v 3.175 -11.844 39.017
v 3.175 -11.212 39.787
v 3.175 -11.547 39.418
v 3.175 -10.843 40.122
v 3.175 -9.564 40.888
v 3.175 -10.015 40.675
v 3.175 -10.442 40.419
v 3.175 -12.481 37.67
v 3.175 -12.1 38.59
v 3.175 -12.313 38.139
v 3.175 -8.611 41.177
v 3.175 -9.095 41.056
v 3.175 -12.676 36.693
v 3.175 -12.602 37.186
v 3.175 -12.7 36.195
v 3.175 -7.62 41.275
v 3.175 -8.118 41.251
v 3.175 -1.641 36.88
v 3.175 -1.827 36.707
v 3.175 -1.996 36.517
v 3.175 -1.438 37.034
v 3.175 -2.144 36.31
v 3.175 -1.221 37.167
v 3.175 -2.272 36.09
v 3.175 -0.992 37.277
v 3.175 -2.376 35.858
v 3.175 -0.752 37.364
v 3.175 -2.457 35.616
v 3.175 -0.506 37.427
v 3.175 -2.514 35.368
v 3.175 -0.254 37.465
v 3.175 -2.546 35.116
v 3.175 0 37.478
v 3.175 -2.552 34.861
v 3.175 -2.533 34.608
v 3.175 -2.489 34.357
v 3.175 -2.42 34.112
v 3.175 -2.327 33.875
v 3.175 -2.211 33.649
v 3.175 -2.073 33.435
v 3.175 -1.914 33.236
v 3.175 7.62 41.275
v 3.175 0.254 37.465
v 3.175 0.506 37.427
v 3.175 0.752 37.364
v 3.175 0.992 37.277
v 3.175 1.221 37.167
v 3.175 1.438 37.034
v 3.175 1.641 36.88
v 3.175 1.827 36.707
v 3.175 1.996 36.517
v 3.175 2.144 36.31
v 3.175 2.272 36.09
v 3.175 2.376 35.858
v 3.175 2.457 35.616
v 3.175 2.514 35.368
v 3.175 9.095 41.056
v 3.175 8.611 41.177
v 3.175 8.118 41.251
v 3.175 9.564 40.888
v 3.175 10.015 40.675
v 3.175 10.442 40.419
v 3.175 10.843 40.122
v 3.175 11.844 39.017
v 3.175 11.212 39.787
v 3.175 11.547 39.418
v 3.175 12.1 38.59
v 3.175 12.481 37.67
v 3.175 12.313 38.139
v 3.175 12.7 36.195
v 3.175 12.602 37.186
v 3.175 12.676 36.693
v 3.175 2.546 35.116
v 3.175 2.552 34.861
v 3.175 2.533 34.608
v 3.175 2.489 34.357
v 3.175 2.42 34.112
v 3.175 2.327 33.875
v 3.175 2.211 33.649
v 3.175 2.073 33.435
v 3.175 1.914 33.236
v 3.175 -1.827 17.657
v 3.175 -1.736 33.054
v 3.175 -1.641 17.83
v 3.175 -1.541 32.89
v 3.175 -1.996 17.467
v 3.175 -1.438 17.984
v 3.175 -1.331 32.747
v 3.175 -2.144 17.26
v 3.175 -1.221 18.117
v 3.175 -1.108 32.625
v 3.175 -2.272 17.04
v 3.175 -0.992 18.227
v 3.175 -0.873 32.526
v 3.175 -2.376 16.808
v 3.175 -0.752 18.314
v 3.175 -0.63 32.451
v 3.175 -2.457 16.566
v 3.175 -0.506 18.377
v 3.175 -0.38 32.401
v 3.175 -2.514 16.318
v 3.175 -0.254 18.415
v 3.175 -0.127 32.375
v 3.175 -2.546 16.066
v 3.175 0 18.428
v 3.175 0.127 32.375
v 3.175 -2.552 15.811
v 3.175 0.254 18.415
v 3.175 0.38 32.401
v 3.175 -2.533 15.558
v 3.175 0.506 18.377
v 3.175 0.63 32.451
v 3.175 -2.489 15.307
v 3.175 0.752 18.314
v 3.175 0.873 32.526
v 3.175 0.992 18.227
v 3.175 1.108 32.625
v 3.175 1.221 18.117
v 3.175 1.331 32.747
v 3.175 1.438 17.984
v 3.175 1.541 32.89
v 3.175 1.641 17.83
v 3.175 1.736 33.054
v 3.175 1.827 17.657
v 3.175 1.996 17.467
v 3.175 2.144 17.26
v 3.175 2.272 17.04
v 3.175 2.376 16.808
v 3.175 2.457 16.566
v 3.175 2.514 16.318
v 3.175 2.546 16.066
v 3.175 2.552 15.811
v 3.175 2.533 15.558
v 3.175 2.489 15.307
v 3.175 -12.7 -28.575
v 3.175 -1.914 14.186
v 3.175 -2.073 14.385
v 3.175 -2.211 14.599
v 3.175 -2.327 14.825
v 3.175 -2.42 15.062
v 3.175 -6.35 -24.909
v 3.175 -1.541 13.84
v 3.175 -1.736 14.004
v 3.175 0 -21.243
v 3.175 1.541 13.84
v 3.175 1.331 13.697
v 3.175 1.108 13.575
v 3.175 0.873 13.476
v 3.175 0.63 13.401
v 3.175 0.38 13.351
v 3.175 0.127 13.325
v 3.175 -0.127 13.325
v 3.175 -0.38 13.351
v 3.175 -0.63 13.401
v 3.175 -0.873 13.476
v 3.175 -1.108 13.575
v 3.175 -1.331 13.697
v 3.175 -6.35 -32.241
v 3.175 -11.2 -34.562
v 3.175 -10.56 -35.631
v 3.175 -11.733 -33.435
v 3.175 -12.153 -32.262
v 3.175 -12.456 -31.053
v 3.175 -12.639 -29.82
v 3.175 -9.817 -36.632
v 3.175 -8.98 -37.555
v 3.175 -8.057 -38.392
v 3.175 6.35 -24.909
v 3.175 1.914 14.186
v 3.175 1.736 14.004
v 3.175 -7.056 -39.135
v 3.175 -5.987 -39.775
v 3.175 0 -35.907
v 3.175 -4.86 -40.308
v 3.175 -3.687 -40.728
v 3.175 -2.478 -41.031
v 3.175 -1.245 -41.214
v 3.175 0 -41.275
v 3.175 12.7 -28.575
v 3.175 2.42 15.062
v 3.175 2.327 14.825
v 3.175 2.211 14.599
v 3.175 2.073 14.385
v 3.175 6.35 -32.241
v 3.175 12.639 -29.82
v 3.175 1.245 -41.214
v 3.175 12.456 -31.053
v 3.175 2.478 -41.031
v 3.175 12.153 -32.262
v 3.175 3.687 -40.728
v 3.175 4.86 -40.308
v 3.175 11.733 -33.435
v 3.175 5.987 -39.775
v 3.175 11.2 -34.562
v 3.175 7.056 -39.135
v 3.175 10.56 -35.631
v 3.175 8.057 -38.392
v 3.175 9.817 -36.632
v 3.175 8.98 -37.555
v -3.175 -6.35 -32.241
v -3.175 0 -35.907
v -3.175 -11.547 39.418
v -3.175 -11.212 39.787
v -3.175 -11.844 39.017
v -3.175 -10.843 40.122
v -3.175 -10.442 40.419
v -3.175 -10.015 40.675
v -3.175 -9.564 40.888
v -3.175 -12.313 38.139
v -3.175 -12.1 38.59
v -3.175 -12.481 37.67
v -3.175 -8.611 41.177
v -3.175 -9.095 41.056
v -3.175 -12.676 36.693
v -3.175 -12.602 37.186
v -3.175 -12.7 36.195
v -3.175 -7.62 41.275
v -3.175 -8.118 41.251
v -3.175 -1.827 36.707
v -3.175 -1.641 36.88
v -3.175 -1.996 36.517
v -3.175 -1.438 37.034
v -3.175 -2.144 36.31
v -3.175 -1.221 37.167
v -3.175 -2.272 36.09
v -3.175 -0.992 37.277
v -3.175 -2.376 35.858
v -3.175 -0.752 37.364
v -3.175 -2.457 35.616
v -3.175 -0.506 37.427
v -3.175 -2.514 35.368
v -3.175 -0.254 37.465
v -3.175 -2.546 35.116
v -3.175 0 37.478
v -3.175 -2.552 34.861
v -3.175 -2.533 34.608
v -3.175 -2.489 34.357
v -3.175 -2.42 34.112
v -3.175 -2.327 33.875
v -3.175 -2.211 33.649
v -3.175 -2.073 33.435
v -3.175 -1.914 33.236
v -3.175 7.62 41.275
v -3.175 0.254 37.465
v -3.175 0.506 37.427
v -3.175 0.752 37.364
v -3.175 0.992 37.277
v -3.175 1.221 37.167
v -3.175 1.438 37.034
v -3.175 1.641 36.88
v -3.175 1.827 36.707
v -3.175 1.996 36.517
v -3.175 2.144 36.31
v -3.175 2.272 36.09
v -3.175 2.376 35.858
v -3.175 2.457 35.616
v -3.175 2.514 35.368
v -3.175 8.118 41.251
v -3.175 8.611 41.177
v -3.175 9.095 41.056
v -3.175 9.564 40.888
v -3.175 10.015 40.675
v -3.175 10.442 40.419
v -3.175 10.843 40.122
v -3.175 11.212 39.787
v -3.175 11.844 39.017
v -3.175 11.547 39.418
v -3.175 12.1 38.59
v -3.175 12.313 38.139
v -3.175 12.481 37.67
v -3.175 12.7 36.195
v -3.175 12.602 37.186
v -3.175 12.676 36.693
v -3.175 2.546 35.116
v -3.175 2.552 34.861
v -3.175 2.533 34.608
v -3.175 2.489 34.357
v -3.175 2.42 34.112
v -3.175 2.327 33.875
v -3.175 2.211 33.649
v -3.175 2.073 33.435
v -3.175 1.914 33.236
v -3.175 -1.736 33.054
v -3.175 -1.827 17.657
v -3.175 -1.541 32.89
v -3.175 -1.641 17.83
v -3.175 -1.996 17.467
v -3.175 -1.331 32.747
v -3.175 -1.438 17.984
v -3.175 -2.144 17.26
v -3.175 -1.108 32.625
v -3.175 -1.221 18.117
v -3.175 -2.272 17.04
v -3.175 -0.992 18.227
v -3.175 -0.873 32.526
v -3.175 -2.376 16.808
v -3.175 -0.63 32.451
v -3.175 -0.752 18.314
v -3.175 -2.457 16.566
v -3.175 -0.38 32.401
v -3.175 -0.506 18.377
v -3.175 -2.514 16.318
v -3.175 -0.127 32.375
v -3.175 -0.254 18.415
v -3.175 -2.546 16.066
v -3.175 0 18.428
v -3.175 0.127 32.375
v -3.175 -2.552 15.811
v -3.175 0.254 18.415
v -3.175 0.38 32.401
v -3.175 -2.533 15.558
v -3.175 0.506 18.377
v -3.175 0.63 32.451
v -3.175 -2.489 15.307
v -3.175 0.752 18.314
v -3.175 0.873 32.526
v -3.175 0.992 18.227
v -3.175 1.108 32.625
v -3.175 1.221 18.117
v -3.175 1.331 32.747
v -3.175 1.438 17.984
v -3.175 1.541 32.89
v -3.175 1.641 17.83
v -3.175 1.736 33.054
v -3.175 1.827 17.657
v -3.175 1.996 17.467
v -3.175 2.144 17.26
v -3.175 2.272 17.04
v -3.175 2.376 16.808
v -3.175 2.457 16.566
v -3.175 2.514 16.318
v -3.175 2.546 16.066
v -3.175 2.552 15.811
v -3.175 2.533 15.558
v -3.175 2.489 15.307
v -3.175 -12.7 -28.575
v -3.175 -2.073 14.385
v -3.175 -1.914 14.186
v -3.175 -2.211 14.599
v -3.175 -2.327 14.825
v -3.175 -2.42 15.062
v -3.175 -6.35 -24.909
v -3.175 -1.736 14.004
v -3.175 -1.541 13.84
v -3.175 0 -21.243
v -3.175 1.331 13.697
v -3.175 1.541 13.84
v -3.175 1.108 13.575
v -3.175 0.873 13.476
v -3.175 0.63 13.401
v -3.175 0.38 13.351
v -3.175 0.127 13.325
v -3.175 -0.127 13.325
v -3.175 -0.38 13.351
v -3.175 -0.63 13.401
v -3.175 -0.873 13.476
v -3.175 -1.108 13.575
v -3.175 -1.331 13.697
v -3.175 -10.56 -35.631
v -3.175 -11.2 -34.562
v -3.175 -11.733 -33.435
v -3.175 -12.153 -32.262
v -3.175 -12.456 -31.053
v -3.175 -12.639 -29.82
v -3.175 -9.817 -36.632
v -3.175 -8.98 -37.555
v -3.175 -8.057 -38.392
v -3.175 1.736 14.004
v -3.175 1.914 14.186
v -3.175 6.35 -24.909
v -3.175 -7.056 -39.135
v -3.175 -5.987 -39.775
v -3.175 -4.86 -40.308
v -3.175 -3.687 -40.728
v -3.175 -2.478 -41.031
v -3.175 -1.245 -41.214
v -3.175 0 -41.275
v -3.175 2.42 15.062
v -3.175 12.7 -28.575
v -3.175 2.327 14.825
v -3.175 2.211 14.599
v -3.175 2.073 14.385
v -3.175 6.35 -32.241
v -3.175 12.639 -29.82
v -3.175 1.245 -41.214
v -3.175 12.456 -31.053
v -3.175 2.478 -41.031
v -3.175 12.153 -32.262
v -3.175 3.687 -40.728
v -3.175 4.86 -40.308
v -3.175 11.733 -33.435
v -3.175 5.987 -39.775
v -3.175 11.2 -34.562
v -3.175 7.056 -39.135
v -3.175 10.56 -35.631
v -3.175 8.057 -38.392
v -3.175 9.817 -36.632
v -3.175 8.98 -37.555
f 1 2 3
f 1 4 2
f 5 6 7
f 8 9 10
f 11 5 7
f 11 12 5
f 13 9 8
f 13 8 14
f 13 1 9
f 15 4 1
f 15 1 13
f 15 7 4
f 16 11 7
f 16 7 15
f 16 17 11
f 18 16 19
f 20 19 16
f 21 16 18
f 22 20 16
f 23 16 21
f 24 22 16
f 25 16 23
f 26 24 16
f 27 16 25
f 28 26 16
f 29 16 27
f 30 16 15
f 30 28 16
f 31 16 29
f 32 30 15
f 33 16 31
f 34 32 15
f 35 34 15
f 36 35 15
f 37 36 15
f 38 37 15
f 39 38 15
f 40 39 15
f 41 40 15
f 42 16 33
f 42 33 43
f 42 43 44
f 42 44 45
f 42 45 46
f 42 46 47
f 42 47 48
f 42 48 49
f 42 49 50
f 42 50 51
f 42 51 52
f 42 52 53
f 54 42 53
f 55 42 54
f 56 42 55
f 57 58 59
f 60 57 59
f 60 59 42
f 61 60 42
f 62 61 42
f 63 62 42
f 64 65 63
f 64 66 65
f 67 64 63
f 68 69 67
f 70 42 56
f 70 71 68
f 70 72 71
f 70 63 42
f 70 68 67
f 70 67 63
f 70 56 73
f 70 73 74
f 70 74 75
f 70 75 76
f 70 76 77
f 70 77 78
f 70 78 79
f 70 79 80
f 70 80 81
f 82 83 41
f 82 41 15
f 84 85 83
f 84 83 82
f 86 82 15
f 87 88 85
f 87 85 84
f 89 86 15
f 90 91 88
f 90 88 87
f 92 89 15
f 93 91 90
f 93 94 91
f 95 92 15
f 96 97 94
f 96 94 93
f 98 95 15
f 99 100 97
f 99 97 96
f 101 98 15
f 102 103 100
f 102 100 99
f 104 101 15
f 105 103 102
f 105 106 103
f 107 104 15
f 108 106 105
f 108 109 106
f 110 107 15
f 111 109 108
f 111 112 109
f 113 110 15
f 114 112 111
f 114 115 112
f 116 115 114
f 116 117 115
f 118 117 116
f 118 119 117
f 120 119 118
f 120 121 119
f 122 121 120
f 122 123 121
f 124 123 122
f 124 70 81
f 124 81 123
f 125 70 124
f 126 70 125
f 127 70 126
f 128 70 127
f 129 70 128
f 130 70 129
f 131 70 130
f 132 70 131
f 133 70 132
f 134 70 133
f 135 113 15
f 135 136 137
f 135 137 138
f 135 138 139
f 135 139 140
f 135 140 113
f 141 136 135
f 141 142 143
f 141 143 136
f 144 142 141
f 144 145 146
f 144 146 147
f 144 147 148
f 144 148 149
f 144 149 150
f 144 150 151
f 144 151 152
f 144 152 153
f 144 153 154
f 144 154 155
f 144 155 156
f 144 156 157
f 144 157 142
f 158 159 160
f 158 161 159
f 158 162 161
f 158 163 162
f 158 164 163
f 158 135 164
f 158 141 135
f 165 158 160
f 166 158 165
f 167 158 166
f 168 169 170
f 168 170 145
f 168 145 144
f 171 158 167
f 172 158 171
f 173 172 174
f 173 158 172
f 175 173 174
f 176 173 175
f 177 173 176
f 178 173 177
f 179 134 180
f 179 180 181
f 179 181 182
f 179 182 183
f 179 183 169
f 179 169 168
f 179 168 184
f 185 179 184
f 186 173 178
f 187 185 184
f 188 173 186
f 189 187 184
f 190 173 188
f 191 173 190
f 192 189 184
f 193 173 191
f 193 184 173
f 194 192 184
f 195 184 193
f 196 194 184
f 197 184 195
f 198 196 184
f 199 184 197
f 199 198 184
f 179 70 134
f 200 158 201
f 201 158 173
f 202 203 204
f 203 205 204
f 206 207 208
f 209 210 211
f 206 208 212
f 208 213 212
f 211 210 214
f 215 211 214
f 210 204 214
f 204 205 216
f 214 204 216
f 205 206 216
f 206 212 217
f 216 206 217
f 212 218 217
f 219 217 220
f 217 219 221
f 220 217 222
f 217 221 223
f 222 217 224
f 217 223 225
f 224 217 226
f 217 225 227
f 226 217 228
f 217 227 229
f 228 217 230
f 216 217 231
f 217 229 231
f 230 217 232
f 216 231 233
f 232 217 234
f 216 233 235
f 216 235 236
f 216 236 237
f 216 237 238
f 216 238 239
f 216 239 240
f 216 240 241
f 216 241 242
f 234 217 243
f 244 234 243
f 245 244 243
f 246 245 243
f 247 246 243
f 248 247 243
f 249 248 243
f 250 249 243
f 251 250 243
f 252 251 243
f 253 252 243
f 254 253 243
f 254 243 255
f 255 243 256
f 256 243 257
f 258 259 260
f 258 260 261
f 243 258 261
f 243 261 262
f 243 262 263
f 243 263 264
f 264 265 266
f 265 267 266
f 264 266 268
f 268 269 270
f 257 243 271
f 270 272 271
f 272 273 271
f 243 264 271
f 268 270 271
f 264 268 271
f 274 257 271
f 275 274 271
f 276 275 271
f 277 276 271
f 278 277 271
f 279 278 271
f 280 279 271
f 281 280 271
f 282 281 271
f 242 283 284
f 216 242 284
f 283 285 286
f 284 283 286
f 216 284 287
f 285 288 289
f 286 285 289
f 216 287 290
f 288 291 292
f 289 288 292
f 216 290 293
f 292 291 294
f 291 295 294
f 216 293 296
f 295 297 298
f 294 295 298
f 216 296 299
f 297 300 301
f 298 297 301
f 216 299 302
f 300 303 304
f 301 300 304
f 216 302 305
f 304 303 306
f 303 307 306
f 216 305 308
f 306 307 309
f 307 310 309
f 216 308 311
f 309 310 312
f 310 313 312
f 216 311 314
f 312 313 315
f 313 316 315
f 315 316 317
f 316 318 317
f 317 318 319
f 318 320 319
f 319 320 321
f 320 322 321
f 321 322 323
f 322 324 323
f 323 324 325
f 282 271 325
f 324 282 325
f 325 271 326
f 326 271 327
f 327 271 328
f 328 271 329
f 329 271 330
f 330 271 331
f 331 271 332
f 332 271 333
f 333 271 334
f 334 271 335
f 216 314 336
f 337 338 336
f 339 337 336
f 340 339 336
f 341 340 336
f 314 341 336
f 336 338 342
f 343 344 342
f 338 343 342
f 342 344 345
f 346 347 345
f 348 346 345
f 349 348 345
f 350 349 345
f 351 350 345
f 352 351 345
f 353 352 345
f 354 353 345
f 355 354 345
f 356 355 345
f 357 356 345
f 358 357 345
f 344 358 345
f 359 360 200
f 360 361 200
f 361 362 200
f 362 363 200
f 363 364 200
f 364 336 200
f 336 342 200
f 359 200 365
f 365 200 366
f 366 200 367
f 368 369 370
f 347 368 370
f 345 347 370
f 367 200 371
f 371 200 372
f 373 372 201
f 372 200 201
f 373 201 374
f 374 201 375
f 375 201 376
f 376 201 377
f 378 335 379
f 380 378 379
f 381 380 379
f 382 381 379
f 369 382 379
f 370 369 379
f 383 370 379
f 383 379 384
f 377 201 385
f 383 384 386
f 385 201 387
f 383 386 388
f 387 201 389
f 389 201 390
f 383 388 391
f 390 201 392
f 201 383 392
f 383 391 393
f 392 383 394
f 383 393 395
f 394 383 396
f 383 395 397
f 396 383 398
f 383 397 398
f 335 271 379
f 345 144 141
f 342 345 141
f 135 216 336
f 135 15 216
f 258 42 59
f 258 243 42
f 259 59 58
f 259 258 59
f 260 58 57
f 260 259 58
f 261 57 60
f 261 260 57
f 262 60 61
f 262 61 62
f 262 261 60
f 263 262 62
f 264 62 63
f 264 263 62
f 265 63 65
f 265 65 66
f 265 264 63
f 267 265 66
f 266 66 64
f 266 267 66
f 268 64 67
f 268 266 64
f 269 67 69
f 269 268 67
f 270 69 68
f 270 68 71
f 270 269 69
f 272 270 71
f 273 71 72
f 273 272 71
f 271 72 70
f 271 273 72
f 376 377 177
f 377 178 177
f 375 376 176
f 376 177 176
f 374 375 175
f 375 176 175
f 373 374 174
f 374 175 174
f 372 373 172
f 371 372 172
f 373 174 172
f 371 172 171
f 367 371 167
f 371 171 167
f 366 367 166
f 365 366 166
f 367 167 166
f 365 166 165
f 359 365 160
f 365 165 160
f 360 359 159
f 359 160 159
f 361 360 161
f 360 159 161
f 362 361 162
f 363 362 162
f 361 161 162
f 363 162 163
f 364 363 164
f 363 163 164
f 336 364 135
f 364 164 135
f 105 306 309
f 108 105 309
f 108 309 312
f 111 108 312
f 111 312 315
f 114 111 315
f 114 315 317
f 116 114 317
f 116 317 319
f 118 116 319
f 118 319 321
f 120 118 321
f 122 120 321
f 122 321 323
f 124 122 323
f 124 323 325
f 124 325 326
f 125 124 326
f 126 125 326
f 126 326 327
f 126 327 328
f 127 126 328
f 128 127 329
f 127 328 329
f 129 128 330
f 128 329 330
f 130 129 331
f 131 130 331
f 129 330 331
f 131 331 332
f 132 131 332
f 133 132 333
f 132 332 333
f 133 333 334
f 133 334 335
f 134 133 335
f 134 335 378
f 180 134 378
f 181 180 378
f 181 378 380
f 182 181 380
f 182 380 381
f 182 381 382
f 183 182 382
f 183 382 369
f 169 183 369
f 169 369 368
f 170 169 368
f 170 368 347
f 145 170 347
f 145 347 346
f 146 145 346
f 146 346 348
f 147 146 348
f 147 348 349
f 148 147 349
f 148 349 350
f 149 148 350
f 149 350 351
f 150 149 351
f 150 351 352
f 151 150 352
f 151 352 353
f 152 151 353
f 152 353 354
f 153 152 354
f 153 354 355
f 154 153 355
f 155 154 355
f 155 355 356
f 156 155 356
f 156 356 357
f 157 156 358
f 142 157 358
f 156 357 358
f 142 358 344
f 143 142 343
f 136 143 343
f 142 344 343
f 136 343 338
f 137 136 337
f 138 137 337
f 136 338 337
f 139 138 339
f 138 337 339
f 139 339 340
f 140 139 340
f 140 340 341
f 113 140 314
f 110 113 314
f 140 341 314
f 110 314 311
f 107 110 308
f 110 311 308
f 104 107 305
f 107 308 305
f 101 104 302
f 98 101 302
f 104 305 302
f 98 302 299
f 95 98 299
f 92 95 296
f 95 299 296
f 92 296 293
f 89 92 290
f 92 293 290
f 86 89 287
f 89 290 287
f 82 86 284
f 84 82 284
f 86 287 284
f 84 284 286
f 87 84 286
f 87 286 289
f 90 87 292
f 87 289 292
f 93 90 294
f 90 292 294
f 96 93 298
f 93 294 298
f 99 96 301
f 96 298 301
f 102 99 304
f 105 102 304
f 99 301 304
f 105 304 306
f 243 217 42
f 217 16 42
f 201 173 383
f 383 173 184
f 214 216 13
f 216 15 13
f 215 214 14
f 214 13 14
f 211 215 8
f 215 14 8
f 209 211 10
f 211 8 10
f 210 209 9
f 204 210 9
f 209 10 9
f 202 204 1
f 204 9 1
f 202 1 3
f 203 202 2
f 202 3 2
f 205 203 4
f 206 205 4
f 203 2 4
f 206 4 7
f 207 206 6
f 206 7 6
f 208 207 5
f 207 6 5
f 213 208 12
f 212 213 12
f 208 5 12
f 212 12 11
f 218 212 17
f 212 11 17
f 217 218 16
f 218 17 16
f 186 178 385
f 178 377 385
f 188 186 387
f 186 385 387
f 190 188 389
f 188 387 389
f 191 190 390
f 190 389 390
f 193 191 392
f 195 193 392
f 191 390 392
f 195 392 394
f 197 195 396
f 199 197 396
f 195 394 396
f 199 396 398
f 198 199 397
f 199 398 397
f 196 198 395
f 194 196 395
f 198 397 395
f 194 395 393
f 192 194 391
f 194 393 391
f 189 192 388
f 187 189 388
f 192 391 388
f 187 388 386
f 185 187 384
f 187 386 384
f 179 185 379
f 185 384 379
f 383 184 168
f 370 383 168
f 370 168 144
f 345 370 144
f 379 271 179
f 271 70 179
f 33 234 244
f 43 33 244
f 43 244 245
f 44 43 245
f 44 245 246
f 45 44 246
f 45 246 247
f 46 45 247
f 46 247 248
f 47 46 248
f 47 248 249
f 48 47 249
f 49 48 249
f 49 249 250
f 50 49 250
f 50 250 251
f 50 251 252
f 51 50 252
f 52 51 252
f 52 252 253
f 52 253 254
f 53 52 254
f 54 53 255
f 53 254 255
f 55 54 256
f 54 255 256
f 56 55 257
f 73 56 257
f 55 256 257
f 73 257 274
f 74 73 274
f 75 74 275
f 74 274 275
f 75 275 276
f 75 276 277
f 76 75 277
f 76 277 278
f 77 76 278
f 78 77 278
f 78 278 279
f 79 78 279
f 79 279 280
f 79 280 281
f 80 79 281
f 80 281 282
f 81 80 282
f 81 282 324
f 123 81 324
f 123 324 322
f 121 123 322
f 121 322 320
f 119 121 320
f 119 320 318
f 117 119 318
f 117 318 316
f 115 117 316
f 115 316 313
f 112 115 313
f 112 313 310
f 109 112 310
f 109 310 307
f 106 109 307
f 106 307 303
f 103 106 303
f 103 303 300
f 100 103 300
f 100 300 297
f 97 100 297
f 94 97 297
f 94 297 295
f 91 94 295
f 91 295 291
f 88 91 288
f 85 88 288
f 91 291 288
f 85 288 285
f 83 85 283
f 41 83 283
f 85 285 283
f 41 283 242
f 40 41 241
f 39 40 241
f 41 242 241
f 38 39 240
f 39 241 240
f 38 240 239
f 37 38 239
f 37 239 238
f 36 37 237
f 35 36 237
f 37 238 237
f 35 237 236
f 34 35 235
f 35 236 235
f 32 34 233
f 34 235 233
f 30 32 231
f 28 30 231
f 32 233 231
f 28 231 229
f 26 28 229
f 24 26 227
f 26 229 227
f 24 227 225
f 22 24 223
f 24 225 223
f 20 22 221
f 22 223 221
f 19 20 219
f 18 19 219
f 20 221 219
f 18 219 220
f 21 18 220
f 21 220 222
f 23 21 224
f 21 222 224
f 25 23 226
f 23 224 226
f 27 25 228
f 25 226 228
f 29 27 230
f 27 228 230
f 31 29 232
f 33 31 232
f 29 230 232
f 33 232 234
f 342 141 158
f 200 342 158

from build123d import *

# Parameters (mm, degrees)
SKETCH1_W              = 82.55
SKETCH1_H              = 25.4
BOSS_EXTRUDE1_DEPTH    = 3.175
FILLET1_R              = 12.7
F_10_CLEARANCE_HOLE1_D = 5.1054
FILLET2_R              = 5.08
CUT_EXTRUDE1_DEPTH     = 44.649033494


with BuildPart() as part:
    # Sketch1 → Boss-Extrude1 (new, symmetric)
    with BuildSketch(Plane(origin=(0, 0, 0), x_dir=(0, 0, -1), z_dir=(1, 0, 0))):
        Rectangle(SKETCH1_W, SKETCH1_H)
    extrude(amount=BOSS_EXTRUDE1_DEPTH, both=True)

    # Fillet1
    fillet1_edges = [part.edges().sort_by_distance(p)[0] for p in [
        (0, -12.7, -41.275),
        (0, 12.7, -41.275),
    ]]
    fillet(fillet1_edges, radius=FILLET1_R - 0.0001)  # a hair under: the kernel refuses the full size

    # #10 Clearance Hole1 (through all)
    with Locations(Plane(origin=(3.175, 6.272913445, 168.827028559), x_dir=(0, 0, -1), z_dir=(1, 0, 0))):
        with Locations((152.952028559, -6.272913445), (133.902028559, -6.272913445)):
            Hole(F_10_CLEARANCE_HOLE1_D / 2)

    # Fillet2
    fillet2_edges = [part.edges().sort_by_distance(p)[0] for p in [
        (0, -12.7, 41.275),
        (0, 12.7, 41.275),
    ]]
    fillet(fillet2_edges, radius=FILLET2_R)

    # Sketch7 → Cut-Extrude1 (cut, through all)
    with BuildSketch(Plane(origin=(3.175, 0, 0), x_dir=(0, 0, -1), z_dir=(1, 0, 0))):
        Polygon((32.241174209, 6.35), (24.908825791, 6.35), (21.242651581, 0), (24.908825791, -6.35), (32.241174209, -6.35), (35.907348419, 0), align=None)
    extrude(amount=-CUT_EXTRUDE1_DEPTH, mode=Mode.SUBTRACT)


solid = part.part
